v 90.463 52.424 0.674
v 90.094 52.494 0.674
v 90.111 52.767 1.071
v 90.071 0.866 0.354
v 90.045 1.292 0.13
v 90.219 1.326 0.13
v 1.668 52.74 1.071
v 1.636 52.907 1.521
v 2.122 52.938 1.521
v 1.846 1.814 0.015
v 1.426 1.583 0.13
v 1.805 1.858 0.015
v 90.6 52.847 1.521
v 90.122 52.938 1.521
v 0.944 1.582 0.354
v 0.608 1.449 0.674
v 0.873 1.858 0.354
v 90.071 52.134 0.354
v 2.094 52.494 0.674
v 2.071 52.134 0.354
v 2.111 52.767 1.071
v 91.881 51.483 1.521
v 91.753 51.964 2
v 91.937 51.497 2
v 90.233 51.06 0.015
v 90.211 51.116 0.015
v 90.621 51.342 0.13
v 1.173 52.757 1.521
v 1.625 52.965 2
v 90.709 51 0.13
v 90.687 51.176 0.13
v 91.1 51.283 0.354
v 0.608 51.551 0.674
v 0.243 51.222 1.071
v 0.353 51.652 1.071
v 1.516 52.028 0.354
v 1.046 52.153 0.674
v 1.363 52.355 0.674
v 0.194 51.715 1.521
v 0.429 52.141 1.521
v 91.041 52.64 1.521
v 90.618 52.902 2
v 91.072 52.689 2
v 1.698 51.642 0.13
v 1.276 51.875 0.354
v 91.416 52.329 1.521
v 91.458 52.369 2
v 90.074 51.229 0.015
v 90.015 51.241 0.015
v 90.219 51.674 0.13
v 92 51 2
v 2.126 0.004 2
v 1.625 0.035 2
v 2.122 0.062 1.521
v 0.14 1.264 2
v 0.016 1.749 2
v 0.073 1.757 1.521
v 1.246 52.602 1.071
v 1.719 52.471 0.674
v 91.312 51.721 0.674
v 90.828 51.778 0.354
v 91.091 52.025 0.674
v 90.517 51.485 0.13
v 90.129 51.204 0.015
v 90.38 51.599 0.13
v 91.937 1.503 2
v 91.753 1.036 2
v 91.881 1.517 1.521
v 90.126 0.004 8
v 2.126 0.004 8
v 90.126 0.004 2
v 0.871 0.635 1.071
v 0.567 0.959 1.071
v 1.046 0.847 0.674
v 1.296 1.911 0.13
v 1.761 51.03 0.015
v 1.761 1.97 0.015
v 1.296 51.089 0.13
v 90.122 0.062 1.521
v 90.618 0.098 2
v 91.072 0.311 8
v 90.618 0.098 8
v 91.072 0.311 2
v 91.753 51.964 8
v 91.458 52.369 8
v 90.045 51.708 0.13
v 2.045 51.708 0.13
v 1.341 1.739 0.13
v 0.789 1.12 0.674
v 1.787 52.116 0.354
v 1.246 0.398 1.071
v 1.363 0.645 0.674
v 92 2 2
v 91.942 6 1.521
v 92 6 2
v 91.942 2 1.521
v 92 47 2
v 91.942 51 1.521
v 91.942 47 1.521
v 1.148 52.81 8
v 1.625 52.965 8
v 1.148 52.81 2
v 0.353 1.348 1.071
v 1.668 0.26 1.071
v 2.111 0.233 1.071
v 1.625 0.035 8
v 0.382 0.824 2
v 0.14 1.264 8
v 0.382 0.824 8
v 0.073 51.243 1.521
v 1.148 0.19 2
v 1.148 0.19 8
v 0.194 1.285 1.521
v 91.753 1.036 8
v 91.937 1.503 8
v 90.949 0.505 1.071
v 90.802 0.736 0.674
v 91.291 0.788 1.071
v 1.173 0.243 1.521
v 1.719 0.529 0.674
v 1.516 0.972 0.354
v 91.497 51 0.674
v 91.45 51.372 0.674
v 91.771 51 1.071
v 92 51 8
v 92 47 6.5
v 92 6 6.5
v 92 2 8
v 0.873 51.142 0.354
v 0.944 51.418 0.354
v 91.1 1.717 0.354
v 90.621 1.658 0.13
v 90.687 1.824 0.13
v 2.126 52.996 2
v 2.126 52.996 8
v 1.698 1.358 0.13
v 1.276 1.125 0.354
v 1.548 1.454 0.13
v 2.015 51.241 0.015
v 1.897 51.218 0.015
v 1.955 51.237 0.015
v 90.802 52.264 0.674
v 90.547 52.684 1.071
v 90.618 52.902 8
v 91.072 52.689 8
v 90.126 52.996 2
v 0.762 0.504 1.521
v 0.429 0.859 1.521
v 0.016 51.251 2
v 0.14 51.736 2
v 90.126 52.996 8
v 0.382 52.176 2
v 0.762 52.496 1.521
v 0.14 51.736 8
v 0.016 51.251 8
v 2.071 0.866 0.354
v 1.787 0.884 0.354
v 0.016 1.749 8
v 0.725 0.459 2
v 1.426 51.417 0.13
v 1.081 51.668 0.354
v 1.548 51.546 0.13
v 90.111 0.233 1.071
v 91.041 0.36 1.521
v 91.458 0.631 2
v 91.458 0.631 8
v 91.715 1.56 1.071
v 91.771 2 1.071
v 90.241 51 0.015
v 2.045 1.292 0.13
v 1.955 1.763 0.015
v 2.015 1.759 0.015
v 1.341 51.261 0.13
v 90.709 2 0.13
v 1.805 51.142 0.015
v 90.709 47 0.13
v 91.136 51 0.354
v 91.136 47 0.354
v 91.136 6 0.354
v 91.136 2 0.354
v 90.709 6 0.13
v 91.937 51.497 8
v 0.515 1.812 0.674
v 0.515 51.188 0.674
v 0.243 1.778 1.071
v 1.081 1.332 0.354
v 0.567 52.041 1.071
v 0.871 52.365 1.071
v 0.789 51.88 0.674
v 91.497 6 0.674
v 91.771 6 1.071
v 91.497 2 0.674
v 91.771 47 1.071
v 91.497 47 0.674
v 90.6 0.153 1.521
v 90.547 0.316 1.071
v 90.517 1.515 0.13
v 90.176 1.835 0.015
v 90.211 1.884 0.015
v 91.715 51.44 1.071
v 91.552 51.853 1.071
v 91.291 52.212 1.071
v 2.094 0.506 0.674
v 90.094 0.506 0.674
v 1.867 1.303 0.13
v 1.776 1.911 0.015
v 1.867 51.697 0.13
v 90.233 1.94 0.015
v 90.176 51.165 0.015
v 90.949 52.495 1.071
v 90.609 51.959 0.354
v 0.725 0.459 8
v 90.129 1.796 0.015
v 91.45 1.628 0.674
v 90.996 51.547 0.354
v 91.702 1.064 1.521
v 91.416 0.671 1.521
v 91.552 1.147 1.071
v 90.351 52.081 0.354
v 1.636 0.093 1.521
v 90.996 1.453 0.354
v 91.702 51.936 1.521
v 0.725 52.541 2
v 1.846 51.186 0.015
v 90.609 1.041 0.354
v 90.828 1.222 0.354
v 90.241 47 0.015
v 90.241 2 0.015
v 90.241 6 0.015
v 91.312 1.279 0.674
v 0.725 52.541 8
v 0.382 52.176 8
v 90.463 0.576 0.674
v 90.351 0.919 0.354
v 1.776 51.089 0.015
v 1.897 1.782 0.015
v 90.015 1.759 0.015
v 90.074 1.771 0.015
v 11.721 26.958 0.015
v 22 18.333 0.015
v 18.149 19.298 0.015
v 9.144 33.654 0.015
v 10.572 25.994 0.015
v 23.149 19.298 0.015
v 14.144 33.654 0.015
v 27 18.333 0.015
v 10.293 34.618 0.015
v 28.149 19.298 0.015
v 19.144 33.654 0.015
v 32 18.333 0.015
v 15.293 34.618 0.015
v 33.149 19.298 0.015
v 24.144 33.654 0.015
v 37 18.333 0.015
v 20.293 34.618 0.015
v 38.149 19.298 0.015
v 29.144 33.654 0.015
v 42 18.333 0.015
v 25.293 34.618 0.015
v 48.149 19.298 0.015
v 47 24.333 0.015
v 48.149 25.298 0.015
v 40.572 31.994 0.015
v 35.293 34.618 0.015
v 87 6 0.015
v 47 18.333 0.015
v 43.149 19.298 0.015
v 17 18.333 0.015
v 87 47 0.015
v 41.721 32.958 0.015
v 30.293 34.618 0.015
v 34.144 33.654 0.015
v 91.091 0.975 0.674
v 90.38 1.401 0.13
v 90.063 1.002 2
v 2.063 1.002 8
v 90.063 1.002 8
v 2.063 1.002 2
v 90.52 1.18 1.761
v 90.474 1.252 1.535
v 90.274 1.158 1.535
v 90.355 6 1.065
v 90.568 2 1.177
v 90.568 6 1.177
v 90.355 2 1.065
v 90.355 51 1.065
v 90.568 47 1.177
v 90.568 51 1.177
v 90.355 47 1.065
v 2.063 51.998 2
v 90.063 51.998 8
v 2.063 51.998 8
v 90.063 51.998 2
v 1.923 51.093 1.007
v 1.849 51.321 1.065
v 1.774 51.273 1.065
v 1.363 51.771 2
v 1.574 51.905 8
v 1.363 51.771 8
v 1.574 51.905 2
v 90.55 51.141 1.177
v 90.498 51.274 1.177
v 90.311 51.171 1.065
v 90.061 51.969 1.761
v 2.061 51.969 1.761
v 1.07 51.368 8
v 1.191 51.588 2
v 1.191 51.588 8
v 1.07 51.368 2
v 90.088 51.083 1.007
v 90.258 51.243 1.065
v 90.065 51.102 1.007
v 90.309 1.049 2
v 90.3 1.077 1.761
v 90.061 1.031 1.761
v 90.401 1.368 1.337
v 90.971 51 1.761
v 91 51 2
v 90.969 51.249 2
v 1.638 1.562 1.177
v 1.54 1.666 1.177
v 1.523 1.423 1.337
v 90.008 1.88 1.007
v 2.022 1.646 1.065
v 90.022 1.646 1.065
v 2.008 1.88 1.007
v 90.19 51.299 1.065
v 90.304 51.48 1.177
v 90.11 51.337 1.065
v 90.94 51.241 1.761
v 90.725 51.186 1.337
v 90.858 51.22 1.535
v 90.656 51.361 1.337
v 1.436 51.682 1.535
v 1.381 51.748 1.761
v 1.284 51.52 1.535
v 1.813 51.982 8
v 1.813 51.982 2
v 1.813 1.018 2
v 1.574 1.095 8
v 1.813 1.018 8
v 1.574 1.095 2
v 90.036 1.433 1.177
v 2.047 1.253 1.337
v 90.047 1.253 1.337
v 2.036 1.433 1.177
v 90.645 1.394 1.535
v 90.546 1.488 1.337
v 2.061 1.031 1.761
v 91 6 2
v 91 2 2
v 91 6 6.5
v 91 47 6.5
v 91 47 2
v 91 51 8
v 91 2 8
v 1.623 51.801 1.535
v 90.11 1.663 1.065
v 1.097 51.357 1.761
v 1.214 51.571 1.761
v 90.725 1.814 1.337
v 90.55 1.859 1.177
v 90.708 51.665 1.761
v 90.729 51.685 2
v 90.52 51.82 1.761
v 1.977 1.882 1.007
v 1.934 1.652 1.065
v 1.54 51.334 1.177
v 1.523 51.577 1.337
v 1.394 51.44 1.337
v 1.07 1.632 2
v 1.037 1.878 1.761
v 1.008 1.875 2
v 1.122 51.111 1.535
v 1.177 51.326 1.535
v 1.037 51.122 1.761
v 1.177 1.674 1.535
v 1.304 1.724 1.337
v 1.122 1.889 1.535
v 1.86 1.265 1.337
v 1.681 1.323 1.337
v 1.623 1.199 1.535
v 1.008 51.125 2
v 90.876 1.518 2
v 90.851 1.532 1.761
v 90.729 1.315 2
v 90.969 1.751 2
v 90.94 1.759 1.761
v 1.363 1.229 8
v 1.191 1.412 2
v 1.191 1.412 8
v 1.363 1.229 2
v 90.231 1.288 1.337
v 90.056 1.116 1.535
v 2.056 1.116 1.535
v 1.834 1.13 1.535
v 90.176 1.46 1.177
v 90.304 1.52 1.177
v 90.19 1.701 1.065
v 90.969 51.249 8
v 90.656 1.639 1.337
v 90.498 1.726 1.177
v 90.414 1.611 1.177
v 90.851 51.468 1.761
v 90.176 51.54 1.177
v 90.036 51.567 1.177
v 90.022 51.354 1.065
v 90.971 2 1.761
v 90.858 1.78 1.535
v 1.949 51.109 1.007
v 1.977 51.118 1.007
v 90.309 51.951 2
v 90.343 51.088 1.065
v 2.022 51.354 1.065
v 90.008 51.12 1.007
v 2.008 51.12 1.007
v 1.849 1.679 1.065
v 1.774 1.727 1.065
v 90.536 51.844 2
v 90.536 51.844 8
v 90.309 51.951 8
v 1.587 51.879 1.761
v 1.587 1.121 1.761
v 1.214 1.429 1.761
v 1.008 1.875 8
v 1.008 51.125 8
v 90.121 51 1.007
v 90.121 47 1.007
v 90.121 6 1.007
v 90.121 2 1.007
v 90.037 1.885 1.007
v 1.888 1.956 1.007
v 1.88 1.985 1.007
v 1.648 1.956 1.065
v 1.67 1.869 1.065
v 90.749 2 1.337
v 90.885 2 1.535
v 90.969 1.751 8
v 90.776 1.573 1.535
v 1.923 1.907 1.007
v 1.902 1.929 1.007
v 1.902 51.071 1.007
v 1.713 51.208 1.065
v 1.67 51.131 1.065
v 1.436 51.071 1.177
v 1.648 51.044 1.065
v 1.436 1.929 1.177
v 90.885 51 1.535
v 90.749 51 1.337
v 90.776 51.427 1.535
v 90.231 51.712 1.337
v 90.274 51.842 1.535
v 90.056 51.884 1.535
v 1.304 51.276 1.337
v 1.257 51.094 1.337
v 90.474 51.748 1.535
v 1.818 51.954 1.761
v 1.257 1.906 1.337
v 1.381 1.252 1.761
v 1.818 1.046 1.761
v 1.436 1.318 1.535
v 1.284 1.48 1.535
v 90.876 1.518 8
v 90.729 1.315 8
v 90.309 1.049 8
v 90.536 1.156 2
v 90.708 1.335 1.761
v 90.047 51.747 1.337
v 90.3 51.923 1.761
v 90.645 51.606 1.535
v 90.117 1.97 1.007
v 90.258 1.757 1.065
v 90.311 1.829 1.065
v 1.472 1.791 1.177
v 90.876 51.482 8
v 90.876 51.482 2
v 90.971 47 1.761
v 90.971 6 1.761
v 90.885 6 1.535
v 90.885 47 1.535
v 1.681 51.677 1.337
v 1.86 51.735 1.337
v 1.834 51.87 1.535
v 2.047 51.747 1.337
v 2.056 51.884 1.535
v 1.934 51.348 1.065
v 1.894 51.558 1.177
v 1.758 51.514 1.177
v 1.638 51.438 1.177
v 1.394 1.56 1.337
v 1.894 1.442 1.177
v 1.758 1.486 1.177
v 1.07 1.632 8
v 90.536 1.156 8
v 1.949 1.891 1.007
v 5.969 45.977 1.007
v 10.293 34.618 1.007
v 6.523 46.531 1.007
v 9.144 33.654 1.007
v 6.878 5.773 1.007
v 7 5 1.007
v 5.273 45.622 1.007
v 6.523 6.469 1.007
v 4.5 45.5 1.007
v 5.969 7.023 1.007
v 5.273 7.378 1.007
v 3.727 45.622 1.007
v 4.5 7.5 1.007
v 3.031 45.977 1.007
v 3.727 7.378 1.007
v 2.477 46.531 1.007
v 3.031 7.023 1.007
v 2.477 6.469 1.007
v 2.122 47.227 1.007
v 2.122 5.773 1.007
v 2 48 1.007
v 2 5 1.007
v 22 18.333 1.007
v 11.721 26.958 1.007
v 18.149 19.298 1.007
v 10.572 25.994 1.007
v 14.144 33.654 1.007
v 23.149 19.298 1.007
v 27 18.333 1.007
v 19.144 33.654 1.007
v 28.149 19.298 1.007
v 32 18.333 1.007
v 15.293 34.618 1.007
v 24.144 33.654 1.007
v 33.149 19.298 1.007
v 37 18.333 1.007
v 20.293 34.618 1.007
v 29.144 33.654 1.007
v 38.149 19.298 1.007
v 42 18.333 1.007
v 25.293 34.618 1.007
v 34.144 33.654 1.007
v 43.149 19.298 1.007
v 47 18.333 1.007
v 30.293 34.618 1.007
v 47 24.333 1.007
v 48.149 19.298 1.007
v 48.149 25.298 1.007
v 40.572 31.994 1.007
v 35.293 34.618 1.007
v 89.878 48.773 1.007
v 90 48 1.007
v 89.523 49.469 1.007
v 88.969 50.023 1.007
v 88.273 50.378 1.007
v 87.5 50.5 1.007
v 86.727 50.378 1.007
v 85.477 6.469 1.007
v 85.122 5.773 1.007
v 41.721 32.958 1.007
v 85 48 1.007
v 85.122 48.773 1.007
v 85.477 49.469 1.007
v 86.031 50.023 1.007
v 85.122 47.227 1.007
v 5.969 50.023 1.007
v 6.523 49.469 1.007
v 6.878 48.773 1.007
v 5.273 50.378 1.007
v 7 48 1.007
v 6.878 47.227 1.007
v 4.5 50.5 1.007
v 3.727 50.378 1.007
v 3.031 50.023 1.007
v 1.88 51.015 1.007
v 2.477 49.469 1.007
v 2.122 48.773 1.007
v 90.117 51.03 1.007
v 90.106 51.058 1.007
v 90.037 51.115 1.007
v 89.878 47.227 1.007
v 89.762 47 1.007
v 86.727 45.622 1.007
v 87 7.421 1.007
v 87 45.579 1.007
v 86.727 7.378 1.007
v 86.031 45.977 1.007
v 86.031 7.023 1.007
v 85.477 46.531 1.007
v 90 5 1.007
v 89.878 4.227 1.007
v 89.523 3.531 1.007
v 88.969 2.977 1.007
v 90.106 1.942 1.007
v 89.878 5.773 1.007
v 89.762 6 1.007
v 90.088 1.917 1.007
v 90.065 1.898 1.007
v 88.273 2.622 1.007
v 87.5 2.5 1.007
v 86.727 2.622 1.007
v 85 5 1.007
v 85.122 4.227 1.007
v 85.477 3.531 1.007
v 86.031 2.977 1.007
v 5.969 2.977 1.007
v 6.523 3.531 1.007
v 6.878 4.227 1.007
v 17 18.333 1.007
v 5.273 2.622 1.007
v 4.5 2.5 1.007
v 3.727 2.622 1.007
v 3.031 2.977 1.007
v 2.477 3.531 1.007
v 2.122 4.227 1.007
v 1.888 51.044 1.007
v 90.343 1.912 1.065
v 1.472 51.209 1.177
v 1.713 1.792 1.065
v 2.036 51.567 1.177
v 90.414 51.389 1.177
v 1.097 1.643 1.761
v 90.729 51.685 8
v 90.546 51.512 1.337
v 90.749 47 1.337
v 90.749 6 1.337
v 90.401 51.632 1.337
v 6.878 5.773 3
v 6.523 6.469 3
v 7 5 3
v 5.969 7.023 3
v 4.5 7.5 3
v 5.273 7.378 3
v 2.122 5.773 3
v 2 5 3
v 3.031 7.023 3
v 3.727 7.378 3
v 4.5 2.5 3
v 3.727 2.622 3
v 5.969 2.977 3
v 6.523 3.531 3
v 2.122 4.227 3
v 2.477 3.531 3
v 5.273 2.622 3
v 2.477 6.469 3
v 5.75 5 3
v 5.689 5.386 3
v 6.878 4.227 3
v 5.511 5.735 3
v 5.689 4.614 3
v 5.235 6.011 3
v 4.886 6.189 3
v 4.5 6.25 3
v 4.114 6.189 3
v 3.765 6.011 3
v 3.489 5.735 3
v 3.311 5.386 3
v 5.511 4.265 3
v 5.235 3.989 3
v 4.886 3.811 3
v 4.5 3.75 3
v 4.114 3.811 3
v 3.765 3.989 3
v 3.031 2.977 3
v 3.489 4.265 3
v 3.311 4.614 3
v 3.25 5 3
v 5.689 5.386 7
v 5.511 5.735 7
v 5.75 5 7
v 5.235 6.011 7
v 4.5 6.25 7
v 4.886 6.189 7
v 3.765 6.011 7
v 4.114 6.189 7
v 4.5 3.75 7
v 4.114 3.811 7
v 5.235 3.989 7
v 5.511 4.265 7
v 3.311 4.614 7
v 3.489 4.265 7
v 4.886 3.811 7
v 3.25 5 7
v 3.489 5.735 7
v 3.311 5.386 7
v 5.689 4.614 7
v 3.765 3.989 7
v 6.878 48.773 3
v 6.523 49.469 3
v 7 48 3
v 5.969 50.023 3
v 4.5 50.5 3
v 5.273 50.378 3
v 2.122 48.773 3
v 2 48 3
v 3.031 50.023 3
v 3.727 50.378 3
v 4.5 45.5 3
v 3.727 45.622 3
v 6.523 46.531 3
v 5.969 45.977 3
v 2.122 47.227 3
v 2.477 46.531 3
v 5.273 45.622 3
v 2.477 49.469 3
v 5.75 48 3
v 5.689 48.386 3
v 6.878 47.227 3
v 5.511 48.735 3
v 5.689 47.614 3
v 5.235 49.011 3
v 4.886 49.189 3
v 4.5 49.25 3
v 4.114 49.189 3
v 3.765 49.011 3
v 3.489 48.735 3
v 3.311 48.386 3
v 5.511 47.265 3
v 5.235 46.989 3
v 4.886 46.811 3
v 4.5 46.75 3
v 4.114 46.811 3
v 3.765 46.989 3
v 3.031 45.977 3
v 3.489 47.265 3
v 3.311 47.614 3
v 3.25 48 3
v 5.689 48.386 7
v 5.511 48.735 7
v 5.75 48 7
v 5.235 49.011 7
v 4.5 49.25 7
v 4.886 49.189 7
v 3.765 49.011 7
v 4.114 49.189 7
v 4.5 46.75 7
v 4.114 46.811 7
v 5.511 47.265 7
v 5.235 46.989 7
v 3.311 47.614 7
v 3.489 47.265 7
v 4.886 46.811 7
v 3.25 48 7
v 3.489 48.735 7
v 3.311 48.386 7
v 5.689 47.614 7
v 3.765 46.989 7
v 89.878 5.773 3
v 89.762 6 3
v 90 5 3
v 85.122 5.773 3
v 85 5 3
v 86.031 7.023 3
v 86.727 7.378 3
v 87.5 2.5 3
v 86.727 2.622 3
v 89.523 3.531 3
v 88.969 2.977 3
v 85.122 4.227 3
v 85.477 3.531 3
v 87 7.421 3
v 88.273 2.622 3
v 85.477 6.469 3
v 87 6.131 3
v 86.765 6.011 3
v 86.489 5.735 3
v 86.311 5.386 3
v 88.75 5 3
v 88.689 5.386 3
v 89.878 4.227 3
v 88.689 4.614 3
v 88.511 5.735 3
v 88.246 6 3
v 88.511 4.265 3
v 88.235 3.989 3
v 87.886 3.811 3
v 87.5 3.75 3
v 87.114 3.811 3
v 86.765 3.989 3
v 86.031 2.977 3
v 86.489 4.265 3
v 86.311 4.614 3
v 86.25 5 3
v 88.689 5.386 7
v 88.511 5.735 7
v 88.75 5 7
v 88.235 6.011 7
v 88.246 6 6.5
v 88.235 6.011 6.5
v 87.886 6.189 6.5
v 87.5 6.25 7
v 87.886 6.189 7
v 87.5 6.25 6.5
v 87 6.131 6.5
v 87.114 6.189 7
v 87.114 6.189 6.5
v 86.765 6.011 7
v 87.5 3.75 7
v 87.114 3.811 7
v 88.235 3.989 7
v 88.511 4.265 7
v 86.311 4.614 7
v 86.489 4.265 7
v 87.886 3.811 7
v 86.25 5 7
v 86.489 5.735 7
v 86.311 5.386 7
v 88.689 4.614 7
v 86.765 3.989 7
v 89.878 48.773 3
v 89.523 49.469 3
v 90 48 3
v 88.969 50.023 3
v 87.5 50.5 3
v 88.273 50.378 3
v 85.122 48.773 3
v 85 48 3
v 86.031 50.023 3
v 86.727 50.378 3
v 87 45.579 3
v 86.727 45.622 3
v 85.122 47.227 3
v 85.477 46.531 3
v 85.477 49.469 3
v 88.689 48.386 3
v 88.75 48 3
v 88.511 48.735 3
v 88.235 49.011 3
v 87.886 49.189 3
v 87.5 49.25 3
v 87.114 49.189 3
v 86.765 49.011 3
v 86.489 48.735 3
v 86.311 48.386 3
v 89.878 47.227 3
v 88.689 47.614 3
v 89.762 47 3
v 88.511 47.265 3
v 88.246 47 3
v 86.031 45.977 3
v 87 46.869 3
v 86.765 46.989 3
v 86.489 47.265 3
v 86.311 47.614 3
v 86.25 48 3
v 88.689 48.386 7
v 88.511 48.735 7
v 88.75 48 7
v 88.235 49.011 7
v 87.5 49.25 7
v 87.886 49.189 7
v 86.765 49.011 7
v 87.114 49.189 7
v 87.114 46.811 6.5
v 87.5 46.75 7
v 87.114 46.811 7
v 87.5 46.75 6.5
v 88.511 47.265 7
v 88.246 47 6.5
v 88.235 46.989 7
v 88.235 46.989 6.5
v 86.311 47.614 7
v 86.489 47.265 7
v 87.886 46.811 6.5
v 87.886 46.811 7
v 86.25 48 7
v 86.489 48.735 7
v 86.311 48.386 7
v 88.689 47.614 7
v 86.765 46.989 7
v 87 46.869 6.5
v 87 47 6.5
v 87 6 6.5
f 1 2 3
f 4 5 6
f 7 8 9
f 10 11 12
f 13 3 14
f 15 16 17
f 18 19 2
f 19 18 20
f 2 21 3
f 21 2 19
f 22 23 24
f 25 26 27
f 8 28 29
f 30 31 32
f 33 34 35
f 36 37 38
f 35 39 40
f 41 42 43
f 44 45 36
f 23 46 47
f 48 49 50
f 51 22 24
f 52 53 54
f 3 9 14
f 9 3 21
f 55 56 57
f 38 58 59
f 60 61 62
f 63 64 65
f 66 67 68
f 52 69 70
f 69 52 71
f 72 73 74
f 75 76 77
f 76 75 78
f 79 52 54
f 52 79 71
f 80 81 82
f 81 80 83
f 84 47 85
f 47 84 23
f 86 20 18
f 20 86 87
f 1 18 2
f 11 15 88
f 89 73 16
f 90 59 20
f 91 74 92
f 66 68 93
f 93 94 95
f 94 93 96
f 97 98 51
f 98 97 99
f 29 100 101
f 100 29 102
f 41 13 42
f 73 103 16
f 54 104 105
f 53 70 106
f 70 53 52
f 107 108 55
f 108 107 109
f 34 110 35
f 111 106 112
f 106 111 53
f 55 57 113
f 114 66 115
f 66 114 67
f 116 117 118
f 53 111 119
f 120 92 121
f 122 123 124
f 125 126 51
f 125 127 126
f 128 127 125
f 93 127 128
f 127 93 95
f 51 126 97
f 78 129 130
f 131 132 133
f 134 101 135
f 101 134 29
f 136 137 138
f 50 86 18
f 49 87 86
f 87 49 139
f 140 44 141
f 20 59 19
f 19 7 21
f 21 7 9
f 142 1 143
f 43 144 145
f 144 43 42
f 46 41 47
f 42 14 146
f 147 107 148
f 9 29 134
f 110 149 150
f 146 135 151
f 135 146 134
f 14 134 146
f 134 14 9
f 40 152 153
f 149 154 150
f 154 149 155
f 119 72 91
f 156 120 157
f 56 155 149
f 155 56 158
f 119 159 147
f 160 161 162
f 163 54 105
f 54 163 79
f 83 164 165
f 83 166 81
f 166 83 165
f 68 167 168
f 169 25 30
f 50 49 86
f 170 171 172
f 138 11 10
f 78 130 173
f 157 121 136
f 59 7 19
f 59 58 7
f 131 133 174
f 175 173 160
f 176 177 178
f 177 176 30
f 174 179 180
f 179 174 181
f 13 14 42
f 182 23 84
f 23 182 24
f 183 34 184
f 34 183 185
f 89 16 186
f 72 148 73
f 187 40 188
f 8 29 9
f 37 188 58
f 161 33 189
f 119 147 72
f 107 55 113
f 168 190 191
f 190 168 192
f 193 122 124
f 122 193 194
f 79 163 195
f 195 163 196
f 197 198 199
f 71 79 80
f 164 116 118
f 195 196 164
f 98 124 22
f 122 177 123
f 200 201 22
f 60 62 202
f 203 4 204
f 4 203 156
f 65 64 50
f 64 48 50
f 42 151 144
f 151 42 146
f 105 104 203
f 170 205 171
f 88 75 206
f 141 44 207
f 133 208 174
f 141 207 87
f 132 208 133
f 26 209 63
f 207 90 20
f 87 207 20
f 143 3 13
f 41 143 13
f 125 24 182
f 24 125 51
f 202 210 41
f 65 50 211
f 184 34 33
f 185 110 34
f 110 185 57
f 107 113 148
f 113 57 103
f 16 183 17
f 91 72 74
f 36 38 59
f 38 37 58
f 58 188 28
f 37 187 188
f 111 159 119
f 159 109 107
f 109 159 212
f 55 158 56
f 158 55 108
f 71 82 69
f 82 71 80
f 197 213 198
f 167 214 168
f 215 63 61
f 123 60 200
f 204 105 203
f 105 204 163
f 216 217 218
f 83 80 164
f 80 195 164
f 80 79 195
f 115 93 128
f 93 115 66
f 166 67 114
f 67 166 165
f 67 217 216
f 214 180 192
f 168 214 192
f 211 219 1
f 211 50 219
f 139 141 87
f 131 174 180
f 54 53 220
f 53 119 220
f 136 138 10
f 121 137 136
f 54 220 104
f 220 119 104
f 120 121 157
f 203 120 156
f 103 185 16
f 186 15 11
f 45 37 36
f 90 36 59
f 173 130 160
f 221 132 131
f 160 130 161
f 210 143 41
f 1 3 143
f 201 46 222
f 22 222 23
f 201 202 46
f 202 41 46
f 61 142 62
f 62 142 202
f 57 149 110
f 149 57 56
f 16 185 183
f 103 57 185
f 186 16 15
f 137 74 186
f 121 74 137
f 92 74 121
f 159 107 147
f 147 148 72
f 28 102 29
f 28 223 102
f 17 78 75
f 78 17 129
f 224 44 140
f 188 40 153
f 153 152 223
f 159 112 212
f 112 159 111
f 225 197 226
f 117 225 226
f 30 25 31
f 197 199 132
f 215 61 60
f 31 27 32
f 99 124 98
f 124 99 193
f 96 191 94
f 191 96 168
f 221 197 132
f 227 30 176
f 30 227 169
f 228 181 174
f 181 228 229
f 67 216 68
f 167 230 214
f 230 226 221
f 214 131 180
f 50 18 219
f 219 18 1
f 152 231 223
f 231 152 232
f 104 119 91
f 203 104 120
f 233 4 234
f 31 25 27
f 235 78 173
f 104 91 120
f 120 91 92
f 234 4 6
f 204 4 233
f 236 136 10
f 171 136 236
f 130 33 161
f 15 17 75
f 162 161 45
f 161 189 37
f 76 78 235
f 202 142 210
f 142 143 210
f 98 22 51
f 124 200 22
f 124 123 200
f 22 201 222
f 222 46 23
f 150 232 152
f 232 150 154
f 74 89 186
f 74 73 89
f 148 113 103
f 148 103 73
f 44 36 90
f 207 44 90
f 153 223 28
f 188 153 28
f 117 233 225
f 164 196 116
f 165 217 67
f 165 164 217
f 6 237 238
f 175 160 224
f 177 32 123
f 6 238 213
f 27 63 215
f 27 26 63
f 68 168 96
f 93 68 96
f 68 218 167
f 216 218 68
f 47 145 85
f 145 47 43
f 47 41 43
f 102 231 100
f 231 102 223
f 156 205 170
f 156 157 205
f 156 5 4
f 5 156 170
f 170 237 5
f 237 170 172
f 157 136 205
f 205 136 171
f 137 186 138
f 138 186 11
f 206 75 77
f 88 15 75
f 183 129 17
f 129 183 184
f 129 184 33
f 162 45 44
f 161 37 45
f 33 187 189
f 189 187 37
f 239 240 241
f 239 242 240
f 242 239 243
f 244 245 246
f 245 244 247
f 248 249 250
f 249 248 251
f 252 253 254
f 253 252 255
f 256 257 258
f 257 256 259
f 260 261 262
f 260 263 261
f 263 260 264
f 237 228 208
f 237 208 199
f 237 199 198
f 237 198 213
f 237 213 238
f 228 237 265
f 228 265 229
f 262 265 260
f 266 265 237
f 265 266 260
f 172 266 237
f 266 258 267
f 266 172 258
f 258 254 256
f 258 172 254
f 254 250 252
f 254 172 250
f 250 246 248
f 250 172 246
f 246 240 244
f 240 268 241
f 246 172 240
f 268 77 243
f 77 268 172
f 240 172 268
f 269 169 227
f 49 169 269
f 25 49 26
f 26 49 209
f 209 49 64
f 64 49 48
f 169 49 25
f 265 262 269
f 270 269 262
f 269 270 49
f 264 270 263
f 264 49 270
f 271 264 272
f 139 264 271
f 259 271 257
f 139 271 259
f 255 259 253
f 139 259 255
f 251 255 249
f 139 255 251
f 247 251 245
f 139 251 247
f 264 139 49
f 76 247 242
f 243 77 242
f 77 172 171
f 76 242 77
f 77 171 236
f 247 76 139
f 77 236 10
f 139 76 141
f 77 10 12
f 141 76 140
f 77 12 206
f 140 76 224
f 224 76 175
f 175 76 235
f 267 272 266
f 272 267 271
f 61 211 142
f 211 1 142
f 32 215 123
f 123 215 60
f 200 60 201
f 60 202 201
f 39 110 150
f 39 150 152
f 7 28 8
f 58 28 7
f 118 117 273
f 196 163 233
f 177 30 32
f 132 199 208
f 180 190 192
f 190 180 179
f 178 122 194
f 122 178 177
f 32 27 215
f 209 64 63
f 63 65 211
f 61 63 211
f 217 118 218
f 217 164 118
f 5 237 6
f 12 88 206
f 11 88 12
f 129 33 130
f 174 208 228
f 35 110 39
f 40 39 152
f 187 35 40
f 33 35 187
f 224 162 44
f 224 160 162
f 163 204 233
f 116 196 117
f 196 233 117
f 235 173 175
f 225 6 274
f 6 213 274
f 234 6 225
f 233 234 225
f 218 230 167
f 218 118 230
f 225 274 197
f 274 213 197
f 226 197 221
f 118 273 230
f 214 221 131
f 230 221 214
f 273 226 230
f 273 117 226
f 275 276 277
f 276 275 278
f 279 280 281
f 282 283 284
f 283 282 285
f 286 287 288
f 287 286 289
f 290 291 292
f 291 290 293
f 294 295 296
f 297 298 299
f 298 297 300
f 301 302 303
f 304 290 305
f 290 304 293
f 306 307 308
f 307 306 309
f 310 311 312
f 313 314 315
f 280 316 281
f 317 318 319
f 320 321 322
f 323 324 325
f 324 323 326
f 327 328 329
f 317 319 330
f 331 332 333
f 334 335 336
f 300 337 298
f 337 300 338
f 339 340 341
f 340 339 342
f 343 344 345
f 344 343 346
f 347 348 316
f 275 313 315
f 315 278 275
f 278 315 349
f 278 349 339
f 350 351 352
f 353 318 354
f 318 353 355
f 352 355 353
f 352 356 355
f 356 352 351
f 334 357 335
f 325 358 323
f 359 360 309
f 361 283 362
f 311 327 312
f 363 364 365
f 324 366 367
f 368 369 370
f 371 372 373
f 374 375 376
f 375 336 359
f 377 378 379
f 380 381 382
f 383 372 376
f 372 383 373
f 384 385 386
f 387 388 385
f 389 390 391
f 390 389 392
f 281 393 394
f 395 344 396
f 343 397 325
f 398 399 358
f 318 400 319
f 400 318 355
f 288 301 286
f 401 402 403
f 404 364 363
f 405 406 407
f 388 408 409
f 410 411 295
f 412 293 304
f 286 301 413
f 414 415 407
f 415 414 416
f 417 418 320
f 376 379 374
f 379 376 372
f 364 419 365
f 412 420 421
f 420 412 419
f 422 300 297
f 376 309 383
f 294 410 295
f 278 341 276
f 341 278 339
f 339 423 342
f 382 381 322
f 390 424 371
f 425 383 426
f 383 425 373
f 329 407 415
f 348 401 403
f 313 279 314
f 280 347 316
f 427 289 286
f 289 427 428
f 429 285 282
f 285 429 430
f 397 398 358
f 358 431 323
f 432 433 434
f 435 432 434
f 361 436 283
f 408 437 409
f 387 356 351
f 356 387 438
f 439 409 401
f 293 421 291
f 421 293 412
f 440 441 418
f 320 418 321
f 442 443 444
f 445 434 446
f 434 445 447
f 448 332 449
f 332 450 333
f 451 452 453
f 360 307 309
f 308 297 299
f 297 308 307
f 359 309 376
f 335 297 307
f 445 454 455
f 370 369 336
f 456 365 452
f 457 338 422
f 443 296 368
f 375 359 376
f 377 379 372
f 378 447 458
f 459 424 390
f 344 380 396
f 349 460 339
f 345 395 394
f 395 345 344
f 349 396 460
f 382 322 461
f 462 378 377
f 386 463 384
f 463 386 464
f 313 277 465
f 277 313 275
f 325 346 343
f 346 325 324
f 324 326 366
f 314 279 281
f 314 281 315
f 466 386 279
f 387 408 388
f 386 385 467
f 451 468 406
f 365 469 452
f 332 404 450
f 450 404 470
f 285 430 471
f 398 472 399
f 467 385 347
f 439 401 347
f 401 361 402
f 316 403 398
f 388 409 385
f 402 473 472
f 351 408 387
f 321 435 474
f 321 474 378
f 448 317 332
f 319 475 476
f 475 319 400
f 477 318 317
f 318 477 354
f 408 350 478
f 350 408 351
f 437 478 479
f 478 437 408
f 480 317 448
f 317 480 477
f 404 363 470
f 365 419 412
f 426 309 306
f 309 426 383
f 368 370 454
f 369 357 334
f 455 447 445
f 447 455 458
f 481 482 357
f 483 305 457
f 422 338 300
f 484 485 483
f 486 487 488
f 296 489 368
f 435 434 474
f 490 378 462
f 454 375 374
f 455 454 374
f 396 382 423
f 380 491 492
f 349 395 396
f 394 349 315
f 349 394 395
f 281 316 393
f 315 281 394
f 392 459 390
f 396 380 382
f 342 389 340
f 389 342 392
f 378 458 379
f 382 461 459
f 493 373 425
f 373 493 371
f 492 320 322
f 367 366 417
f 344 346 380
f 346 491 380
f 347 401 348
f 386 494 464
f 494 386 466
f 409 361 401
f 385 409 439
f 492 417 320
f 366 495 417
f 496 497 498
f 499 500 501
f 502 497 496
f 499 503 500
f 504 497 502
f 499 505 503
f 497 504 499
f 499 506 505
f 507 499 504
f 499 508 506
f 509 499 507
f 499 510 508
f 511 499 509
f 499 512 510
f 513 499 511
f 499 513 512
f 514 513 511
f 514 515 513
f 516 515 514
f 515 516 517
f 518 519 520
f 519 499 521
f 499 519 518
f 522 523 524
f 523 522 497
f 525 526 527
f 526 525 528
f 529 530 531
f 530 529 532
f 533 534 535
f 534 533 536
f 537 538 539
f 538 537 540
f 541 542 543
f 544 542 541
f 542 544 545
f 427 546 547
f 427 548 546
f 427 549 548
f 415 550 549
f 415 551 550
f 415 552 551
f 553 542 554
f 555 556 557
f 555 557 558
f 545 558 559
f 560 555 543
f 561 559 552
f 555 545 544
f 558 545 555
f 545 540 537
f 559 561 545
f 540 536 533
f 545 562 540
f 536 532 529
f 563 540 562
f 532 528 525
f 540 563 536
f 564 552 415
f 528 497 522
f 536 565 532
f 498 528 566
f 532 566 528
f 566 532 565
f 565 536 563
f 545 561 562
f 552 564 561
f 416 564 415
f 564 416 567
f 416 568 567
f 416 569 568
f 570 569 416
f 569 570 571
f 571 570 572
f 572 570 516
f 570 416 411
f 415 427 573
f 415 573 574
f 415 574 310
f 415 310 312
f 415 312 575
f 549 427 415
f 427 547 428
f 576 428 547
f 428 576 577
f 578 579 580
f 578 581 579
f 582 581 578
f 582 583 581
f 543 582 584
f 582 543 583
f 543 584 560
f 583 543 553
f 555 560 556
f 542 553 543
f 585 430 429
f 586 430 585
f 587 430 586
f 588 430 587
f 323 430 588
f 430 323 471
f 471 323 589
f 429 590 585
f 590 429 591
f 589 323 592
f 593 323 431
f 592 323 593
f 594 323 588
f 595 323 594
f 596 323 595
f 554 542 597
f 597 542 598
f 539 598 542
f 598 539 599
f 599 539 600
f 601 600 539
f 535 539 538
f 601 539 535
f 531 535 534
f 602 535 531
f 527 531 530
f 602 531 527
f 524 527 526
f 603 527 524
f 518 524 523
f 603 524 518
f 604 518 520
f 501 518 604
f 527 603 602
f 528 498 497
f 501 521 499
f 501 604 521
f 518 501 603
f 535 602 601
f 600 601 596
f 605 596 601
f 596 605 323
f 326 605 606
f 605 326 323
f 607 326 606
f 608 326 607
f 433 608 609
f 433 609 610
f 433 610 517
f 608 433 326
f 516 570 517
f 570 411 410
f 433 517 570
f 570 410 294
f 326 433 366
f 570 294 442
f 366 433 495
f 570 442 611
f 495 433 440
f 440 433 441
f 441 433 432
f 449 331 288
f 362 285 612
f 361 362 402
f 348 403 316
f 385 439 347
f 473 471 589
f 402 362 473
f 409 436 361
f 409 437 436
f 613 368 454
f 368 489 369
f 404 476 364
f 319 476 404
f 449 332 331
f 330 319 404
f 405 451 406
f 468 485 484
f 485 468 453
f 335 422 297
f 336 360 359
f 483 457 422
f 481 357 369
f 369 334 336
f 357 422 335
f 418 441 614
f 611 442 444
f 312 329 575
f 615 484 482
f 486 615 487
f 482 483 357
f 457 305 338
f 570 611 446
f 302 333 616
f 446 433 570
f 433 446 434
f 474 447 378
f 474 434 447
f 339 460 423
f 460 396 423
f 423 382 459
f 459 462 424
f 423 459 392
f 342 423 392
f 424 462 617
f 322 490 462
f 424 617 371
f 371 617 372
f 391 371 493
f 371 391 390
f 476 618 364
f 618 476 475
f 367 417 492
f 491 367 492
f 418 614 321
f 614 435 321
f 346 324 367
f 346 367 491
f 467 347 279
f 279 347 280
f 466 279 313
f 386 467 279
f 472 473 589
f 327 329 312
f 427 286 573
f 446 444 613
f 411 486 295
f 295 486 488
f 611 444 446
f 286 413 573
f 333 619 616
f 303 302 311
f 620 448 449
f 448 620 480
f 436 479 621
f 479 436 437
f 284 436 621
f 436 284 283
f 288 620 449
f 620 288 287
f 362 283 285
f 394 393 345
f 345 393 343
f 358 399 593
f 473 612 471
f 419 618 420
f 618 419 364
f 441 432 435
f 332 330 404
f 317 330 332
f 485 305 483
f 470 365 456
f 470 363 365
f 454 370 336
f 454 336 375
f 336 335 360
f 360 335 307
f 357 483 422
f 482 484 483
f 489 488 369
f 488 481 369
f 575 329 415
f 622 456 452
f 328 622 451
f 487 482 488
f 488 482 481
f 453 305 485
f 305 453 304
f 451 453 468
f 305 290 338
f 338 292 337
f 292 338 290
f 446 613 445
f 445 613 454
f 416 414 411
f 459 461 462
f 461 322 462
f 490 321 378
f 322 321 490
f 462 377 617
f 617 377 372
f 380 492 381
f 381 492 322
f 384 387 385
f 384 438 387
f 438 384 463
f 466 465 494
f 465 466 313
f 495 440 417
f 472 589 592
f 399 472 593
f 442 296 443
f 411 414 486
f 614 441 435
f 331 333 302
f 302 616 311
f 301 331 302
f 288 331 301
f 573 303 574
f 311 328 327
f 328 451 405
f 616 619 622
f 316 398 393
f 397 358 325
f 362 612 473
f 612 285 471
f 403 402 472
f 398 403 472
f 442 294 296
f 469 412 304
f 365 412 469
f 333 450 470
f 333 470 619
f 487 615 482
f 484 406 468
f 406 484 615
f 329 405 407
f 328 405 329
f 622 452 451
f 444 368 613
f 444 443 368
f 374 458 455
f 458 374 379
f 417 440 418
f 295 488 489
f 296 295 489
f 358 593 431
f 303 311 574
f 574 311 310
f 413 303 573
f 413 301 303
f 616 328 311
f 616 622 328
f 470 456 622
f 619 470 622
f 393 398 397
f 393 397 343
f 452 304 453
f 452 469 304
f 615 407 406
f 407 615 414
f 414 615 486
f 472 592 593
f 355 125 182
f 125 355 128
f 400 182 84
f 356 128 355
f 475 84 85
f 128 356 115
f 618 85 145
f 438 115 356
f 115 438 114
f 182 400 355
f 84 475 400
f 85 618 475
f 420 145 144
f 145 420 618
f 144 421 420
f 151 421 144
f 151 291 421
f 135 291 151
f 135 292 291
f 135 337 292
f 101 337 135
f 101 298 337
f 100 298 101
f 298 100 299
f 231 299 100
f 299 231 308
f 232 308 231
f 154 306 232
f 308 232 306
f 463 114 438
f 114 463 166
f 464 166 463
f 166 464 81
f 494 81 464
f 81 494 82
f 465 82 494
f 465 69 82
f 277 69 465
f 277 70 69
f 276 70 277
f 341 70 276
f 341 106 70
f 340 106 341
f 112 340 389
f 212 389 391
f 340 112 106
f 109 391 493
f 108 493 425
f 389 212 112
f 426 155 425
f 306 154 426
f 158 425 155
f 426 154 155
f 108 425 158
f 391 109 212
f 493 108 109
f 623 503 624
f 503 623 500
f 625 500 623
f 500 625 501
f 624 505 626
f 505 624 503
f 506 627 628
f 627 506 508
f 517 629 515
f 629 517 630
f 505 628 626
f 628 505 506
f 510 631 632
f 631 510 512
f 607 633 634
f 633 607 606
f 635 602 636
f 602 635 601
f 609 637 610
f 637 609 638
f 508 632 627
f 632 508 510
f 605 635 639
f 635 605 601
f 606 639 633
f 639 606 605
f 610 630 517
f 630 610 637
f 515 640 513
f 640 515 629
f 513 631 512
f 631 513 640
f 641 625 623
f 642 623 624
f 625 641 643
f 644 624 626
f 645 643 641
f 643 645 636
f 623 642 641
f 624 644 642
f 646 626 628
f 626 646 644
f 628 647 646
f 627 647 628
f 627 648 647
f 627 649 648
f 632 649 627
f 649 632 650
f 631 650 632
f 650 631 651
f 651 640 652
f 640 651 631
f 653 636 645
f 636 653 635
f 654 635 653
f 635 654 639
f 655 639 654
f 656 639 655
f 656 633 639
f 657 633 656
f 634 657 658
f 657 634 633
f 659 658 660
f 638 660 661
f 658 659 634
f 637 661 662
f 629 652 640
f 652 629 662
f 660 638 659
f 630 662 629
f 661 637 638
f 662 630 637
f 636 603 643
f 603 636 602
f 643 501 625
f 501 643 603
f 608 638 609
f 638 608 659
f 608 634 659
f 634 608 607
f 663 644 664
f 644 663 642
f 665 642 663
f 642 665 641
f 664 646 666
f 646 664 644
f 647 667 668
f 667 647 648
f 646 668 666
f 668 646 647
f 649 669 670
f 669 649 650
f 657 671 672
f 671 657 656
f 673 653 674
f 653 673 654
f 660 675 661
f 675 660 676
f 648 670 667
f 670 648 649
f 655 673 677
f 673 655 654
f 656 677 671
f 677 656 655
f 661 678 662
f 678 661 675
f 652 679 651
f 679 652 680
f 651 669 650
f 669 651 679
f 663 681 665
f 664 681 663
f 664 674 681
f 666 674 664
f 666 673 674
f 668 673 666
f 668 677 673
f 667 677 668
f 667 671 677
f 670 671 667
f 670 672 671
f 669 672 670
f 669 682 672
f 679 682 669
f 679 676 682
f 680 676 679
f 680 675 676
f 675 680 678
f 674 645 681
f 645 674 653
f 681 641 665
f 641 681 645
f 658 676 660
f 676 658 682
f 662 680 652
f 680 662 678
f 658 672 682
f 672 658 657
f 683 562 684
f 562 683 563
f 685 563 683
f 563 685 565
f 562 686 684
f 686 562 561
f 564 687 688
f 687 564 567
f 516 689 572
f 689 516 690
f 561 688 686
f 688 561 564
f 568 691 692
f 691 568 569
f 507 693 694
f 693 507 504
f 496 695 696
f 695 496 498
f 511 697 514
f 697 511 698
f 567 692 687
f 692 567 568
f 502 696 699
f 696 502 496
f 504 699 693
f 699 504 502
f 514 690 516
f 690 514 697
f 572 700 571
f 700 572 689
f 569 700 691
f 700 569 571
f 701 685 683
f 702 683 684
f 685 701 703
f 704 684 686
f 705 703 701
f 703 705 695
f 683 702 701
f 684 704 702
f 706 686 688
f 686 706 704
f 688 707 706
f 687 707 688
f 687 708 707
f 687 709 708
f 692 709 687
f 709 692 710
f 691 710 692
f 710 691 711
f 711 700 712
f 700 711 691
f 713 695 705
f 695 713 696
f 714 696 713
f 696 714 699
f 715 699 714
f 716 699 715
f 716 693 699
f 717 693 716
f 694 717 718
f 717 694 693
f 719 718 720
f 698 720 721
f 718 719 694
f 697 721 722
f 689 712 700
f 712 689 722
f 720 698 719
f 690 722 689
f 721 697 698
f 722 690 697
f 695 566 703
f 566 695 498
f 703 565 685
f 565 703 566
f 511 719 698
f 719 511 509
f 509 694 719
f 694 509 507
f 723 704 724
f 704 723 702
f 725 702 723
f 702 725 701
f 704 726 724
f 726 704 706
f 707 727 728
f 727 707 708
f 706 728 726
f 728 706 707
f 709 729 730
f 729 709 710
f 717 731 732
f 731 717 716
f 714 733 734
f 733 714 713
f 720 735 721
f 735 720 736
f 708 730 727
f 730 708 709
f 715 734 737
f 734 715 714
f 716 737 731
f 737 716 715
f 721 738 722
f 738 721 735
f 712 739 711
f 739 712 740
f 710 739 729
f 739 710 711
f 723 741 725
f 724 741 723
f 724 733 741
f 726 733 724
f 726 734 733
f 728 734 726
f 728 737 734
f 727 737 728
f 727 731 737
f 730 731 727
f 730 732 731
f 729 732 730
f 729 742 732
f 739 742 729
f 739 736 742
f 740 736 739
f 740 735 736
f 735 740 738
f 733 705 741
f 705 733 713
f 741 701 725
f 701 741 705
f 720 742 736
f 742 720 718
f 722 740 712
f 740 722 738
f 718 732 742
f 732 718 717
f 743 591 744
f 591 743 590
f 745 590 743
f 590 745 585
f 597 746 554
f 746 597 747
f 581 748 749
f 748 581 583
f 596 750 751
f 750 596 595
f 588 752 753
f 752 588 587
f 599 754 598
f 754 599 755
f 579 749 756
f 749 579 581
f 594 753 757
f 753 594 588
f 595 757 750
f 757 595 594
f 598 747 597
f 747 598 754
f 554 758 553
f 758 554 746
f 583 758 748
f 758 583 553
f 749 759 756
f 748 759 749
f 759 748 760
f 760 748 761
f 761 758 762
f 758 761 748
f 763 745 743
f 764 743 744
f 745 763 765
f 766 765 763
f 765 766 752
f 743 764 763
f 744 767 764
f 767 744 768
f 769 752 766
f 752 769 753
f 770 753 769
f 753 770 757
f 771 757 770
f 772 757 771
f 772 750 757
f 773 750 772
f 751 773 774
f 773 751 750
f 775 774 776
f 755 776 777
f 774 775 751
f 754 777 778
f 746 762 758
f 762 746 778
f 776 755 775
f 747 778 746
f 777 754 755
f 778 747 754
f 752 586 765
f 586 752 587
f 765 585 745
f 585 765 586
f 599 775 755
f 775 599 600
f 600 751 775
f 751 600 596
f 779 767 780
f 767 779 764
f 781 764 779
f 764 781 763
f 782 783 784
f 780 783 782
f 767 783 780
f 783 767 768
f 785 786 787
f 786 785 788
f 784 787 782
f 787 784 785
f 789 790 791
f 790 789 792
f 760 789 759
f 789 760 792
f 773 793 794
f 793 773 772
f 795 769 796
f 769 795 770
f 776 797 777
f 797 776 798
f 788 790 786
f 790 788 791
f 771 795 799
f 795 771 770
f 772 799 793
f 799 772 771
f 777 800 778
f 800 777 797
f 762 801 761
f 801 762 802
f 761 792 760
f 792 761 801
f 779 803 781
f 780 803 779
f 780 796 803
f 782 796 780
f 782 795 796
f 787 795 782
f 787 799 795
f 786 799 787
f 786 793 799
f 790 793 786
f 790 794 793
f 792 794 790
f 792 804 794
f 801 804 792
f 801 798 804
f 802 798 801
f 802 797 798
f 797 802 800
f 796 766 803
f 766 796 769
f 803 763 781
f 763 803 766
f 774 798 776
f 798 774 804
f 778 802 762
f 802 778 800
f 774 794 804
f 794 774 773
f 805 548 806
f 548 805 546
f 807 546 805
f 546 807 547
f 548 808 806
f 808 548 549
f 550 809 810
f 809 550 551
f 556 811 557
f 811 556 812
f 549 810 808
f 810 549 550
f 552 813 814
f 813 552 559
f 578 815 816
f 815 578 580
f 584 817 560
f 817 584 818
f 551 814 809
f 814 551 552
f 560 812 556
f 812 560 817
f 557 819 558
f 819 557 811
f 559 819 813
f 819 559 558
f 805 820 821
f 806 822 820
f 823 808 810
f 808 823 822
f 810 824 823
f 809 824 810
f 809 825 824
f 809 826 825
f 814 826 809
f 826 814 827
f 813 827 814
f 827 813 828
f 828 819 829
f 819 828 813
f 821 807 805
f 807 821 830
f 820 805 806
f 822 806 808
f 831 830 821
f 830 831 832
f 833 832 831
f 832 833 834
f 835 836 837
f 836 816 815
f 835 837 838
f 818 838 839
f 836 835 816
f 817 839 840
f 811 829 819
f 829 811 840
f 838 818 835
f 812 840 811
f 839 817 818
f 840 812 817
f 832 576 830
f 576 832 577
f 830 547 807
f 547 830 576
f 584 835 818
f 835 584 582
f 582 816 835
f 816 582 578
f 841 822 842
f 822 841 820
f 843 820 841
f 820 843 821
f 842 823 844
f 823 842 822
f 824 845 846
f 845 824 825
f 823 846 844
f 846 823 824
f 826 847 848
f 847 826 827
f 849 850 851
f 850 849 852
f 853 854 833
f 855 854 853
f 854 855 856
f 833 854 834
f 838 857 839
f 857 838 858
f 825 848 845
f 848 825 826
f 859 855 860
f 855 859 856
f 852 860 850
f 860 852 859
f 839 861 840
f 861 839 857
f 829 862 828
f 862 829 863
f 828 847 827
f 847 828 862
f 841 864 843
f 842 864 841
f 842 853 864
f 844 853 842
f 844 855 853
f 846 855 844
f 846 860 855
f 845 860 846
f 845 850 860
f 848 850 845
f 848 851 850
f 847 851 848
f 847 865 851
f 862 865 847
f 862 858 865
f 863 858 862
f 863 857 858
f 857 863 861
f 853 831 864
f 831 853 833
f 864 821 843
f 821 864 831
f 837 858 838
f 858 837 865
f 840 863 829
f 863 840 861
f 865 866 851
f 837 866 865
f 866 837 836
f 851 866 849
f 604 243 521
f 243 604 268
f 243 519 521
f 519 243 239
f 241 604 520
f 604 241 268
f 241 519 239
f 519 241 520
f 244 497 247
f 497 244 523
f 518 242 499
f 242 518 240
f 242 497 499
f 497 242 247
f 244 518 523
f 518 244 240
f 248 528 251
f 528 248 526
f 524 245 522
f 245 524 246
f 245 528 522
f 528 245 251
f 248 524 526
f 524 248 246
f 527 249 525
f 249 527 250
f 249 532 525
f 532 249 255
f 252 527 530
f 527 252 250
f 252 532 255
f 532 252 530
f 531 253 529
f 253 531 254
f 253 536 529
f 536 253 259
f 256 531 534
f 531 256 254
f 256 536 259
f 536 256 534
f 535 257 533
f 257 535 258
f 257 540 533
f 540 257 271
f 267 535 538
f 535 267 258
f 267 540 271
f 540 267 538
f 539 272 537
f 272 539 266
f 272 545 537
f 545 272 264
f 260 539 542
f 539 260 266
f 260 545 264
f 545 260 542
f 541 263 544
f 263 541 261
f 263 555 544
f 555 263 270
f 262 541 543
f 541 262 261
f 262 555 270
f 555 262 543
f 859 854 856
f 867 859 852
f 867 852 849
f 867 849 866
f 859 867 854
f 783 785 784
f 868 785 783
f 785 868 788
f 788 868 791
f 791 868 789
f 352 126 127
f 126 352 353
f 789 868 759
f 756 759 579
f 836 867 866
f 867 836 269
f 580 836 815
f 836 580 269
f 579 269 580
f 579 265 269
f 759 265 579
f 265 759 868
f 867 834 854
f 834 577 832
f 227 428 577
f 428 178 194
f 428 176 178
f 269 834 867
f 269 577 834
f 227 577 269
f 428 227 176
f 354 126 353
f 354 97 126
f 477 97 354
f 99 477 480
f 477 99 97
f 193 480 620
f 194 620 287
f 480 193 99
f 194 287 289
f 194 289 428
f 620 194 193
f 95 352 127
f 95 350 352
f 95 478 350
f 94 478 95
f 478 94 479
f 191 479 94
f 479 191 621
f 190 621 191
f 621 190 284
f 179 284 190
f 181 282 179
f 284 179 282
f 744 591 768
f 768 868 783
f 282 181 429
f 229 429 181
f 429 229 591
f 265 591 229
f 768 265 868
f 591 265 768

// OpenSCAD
//---------------------------------------------------------
// Yet Another Parameterized Projectbox generator
//
//  This is a box for AVR-Dx64 by Spence Konde
//  see: https://www.tindie.com/products/drazzy/avr128da-development-board-arduino-compatible/
//
//  Version 1.0 (25-01-2022)
//
// This design is parameterized based on the size of a PCB.
//---------------------------------------------------------
include <./library/YAPPgenerator_v14.scad>

// Note: length/lengte refers to X axis, 
//       width/breedte to Y, 
//       height/hoogte to Z

/*
      padding-back|<------pcb length --->|<padding-front
                            RIGHT
        0    X-as ---> 
        +----------------------------------------+   ---
        |                                        |    ^
        |                                        |   padding-right 
        |                                        |    v
        |    -5,y +----------------------+       |   ---              
 B    Y |         | 0,y              x,y |       |     ^              F
 A    - |         |                      |       |     |              R
 C    a |         |                      |       |     | pcb width    O
 K    s |         |                      |       |     |              N
        |         | 0,0              x,0 |       |     v              T
      ^ |   -5,0  +----------------------+       |   ---
      | |                                        |    padding-left
      0 +----------------------------------------+   ---
        0    X-as --->
                          LEFT
*/

printBaseShell      = true;
printLidShell       = false;

// Edit these parameters for your own board dimensions
wallThickness       = 1.0;
basePlaneThickness  = 1.0;
lidPlaneThickness   = 1.0;

baseWallHeight      = 7;
lidWallHeight       = 0;

// Total height of box = basePlaneThickness + lidPlaneThickness 
//                     + baseWallHeight + lidWallHeight
pcbLength           = 88;
pcbWidth            = 49;
pcbThickness        = 1.5;
                            
// padding between pcb and inside wall
paddingFront        = 1;
paddingBack         = 1;
paddingRight        = 1;
paddingLeft         = 1;

// ridge where base and lid off box can overlap
// Make sure this isn't less than lidWallHeight
ridgeHeight         = 0;
ridgeSlack          = 0.1;
roundRadius         = 2.0;

// How much the PCB needs to be raised from the base
// to leave room for solderings and whatnot
standoffHeight      = 2.0;
pinDiameter         = 2.5;
standoffDiameter    = 5;

//-- D E B U G -------------------
showSideBySide      = true;
onLidGap            = 4;
hideLidWalls        = false;
shiftLid            = 10;
colorLid            = "yellow";
hideBaseWalls       = false;
colorBase           = "white";
showPCB             = false;
showMarkers         = false;
inspectX            = 0;  // 0=none, >0 from front, <0 from back
inspectY            = 0;  // 0=none, >0 from left, <0 from right


//-- pcb_standoffs  -- origin is pcb[0,0,0]
// (0) = posx
// (1) = posy
// (2) = { yappBoth | yappLidOnly | yappBaseOnly }
// (3) = { yappHole, YappPin }
pcbStands = [
                [2.5,  3, yappBoth, yappPin] 
               ,[2.5,  pcbWidth-3, yappBoth, yappPin]
               ,[pcbLength-2.5,  3, yappBoth, yappPin]
               ,[pcbLength-2.5, pcbWidth-3, yappBoth, yappPin]
             ];     

//-- Lid plane    -- origin is pcb[0,0,0]
// (0) = posx
// (1) = posy
// (2) = width
// (3) = length
// (4) = angle
// (5) = { yappRectangle | yappCircle }
// (6) = { yappCenter }
cutoutsLid =  [
              ];

//-- base plane    -- origin is pcb[0,0,0]
// (0) = posx
// (1) = posy
// (2) = width
// (3) = length
// (4) = angle
// (5) = { yappRectangle | yappCircle }
// (6) = { yappCenter }
cutoutsBase =   [
                    [15, pcbWidth/3, 10, 1.5, 40, yappRectangle]
                  , [20, pcbWidth/3, 20, 1.5, 40, yappRectangle]
                  , [25, pcbWidth/3, 20, 1.5, 40, yappRectangle]
                  , [30, pcbWidth/3, 20, 1.5, 40, yappRectangle]
                  , [35, pcbWidth/3, 20, 1.5, 40, yappRectangle]
                  , [40, pcbWidth/3, 20, 1.5, 40, yappRectangle]
                  , [45, pcbWidth/3, 20, 1.5, 40, yappRectangle]
                  , [45, (pcbWidth/3)+6, 10, 1.5, 40, yappRectangle]
                ];

//-- front plane  -- origin is pcb[0,0,0]
// (0) = posy
// (1) = posz
// (2) = width
// (3) = height
// (4) = angle
// (5) = { yappRectangle | yappCircle }
// (6) = { yappCenter }
cutoutsFront =  [
                    [pcbWidth/2, 5, pcbWidth-8, 15, 0, yappRectangle, yappCenter] 
                ];

//-- back plane  -- origin is pcb[0,0,0]
// (0) = posy
// (1) = posz
// (2) = width
// (3) = height
// (4) = angle
// (5) = { yappRectangle | yappCircle }
// (6) = { yappCenter }
cutoutsBack =   [
                ];

//-- left plane   -- origin is pcb[0,0,0]
// (0) = posx
// (1) = posz
// (2) = width
// (3) = height
// (4) = angle
// (5) = { yappRectangle | yappCircle }
// (6) = { yappCenter }
cutoutsLeft =   [
                ];

//-- right plane   -- origin is pcb[0,0,0]
// (0) = posx
// (1) = posz
// (2) = width
// (3) = height
// (4) = angle
// (5) = { yappRectangle | yappCircle }
// (6) = { yappCenter }
cutoutsRight =  [
                ];

//-- connectors -- origen = box[0,0,0]
// (0) = posx
// (1) = posy
// (2) = screwDiameter
// (3) = insertDiameter
// (4) = outsideDiameter
// (5) = { yappAllCorners }
connectors   =  [
                ];

//-- base mounts -- origen = box[x0,y0]
// (0) = posx | posy
// (1) = screwDiameter
// (2) = width
// (3) = height
// (4..7) = yappLeft / yappRight / yappFront / yappBack (one or more)
// (5) = { yappCenter }
baseMounts   = [
               ];
               
//-- origin of labels is box [0,0,0]
// (0) = posx
// (1) = posy/z
// (2) = orientation
// (3) = plane {lid | base | left | right | front | back }
// (4) = font
// (5) = size
// (6) = "label text"
labelsPlane =  [
               ];


//---- This is where the magic happens ----
YAPPgenerate();
